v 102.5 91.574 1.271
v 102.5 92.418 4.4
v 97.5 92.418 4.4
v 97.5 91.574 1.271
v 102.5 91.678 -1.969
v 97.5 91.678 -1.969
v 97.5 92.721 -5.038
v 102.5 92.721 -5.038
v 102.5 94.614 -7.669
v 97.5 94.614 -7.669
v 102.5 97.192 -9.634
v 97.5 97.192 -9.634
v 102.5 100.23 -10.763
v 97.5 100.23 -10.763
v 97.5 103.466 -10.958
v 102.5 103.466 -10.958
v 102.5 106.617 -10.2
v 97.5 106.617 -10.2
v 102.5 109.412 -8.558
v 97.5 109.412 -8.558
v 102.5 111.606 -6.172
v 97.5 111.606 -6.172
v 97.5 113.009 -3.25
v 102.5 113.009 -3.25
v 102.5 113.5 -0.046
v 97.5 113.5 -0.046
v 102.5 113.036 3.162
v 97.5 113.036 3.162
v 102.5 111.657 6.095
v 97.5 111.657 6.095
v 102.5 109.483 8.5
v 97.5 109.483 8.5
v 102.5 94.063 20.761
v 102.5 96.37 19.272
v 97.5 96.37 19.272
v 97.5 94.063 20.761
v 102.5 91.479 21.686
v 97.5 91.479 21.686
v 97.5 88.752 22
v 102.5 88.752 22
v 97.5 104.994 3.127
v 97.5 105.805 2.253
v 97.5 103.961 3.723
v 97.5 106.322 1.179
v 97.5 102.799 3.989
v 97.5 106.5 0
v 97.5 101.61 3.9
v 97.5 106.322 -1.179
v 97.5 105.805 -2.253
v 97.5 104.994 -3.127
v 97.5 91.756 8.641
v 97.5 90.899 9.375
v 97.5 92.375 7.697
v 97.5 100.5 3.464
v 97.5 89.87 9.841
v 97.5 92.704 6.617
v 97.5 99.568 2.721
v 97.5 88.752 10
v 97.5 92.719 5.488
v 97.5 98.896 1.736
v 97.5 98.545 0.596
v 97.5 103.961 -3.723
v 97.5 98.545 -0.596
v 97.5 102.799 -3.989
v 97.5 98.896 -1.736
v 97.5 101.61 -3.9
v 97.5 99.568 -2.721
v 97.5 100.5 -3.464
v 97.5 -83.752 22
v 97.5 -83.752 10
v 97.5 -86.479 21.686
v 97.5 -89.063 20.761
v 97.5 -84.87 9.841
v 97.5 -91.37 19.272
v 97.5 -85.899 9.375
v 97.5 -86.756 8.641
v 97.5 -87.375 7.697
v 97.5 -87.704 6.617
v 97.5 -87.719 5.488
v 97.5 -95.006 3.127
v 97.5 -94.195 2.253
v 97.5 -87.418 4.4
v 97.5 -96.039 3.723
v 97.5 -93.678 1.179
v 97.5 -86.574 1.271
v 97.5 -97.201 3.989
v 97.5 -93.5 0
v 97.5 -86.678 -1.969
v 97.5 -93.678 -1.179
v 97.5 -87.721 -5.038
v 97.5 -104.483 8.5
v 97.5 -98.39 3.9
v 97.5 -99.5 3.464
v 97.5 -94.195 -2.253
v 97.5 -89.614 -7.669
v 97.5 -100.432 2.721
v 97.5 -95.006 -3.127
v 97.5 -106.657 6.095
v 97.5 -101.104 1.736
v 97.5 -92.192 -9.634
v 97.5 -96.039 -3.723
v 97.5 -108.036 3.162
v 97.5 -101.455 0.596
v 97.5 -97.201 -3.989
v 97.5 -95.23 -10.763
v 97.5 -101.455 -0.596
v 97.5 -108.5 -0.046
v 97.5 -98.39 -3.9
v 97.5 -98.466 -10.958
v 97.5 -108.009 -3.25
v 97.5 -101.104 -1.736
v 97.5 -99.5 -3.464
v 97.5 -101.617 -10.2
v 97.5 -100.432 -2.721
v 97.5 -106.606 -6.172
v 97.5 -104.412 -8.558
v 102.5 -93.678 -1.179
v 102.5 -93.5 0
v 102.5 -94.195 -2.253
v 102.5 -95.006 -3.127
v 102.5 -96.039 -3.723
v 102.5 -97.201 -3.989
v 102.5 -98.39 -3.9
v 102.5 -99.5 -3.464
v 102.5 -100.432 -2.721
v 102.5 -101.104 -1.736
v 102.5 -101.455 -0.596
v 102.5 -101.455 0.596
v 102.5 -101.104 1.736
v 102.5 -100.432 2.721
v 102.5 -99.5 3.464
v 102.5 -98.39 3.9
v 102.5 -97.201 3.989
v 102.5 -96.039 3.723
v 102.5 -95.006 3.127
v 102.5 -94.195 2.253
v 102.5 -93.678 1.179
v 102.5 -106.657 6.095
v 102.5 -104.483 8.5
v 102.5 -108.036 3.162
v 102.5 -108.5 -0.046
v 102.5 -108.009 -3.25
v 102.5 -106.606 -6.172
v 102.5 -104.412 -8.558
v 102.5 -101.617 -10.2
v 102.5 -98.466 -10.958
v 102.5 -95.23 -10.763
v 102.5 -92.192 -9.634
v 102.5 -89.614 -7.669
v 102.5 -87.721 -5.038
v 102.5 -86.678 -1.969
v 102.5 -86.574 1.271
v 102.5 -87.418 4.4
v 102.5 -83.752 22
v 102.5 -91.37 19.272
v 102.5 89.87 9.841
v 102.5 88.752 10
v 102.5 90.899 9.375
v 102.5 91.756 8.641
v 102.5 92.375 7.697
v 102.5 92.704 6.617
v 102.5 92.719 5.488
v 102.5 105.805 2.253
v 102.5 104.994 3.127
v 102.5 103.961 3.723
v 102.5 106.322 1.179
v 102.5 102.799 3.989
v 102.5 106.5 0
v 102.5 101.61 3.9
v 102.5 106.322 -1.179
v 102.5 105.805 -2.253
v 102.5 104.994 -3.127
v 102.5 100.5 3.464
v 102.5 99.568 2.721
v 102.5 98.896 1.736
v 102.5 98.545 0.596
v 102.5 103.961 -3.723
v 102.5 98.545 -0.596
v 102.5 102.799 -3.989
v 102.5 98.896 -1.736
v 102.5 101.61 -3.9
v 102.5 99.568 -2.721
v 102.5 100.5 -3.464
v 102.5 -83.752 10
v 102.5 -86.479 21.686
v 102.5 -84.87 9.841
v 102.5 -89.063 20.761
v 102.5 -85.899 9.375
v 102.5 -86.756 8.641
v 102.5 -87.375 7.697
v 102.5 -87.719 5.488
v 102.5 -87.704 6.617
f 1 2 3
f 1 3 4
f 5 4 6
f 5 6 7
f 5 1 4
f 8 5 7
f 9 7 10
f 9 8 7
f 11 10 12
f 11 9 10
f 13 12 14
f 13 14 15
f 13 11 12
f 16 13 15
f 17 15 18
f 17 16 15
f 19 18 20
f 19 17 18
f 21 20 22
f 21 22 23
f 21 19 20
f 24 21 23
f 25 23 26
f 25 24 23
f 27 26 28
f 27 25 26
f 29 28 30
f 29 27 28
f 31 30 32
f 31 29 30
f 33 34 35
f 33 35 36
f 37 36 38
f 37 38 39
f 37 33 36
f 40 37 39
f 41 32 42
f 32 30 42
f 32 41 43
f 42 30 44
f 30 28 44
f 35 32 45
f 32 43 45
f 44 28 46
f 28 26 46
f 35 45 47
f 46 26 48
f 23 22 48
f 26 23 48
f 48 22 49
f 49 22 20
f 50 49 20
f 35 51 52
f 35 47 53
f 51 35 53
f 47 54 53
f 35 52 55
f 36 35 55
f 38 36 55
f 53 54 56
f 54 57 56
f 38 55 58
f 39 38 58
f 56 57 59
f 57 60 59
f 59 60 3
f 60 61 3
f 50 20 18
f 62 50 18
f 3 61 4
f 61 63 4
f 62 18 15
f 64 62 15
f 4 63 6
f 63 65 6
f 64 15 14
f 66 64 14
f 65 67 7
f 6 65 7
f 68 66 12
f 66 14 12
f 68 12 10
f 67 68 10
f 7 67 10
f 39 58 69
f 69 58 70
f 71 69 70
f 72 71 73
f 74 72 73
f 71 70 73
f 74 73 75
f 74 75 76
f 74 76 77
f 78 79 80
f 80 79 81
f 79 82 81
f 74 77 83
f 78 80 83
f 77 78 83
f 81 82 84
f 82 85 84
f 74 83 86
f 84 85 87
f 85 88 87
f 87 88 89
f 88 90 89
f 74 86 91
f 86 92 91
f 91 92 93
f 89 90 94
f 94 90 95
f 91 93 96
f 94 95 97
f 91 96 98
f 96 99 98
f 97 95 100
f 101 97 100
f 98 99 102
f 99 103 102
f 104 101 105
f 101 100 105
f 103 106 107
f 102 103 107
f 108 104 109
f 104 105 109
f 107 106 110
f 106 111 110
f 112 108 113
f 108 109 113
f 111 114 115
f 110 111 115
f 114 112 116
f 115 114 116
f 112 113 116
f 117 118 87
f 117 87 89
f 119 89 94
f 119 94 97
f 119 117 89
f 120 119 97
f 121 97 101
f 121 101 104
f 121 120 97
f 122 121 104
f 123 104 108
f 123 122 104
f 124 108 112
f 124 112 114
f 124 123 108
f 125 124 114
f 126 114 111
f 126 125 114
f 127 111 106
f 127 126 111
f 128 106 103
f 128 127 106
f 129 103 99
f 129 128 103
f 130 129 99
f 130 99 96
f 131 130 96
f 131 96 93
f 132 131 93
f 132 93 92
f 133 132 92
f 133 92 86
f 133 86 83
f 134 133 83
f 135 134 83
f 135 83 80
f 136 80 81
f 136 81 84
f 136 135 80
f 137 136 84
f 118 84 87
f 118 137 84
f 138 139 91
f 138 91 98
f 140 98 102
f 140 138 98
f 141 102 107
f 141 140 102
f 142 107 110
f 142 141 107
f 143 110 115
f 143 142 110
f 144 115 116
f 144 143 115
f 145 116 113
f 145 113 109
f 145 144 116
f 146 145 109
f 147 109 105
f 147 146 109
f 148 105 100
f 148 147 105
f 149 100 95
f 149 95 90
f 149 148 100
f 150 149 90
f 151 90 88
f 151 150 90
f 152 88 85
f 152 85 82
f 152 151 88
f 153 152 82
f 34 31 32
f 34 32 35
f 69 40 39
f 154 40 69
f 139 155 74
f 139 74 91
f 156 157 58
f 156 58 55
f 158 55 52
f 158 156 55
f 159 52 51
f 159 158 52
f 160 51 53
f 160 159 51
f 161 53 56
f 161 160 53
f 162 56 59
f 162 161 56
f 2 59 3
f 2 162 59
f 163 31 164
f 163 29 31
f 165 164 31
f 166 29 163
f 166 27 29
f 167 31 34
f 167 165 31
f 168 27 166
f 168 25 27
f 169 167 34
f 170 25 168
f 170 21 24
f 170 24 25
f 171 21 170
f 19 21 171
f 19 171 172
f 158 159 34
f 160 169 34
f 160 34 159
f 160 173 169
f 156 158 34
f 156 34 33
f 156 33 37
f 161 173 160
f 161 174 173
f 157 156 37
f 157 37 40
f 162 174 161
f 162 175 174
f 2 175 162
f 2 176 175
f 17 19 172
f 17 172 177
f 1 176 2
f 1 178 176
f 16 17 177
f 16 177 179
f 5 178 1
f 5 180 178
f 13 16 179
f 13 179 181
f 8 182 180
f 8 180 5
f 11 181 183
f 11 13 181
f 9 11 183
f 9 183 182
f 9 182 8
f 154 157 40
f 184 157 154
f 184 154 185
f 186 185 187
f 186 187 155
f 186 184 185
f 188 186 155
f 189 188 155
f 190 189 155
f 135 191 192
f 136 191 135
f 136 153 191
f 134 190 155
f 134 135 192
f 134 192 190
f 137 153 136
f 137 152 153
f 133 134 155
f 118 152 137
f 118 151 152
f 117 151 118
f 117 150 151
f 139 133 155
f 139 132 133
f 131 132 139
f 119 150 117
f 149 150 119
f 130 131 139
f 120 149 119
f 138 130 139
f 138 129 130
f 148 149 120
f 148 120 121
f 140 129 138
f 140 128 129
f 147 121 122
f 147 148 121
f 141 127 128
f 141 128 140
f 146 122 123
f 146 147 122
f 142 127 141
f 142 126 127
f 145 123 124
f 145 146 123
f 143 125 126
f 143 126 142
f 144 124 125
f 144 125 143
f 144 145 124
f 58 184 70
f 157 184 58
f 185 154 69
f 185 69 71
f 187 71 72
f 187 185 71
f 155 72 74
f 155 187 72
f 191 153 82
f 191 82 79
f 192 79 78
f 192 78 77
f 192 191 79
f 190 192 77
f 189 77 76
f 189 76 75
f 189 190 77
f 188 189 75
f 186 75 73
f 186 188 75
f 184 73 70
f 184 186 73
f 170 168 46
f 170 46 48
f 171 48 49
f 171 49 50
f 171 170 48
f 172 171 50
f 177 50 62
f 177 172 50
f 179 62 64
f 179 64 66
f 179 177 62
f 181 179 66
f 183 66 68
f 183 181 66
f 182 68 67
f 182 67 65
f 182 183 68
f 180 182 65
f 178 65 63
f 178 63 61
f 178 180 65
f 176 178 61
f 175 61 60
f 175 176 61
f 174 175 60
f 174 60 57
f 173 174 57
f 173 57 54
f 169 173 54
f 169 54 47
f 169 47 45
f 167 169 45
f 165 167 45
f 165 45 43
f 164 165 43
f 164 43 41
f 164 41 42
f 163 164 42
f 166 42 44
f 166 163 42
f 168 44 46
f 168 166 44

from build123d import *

# Parameters (mm, degrees)
SKETCH1_R             = 4
BOSS_EXTRUDE1_DEPTH   = 5
BODY_MOVE_COPY1_ANGLE = 90


with BuildPart() as part:
    # Sketch1 → Boss-Extrude1 (new body)
    with BuildSketch(Plane(origin=(0, 0, 0), x_dir=(1, 0, 0), z_dir=(0, 1, 0))):
        with BuildLine():
            Line((13.747727104, -9.999999956), (186.252272934, -9.999999956))
            ThreePointArc((186.252272934, -9.999999956), (189.598913044, -8.190890181), (189.918333485, -4.399999944))
            ThreePointArc((189.918333485, -4.399999944), (202.569546944, 10.695673442), (206.982653657, -8.499561542))
            Line((206.982653657, -8.499561542), (193.869713288, -19.272249007))
            ThreePointArc((193.869713288, -19.272249007), (190.297826985, -21.297499344), (186.252273428, -21.999999956))
            Line((186.252273428, -21.999999956), (13.747727597, -21.999999956))
            ThreePointArc((13.747727597, -21.999999956), (9.702173549, -21.297499522), (6.130286801, -19.272249048))
            Line((6.130286801, -19.272249048), (-6.982653611, -8.499561668))
            ThreePointArc((-6.982653611, -8.499561668), (-2.569547007, 10.695673339), (10.081666543, -4.399999968))
            ThreePointArc((10.081666543, -4.399999968), (10.401087001, -8.190890191), (13.747727104, -9.999999956))
        make_face()
        Circle(SKETCH1_R, mode=Mode.SUBTRACT)
        with Locations((200, 8.8e-08)):
            Circle(SKETCH1_R, mode=Mode.SUBTRACT)
    extrude(amount=BOSS_EXTRUDE1_DEPTH)


with BuildPart() as part_1:
    # Body-Move/Copy1: moved
    add(part.part.moved(Location((0, 0, 0))).rotate(Axis((100, 2.5, 0), (0, 0, 1)), BODY_MOVE_COPY1_ANGLE))


solid = part_1.part
